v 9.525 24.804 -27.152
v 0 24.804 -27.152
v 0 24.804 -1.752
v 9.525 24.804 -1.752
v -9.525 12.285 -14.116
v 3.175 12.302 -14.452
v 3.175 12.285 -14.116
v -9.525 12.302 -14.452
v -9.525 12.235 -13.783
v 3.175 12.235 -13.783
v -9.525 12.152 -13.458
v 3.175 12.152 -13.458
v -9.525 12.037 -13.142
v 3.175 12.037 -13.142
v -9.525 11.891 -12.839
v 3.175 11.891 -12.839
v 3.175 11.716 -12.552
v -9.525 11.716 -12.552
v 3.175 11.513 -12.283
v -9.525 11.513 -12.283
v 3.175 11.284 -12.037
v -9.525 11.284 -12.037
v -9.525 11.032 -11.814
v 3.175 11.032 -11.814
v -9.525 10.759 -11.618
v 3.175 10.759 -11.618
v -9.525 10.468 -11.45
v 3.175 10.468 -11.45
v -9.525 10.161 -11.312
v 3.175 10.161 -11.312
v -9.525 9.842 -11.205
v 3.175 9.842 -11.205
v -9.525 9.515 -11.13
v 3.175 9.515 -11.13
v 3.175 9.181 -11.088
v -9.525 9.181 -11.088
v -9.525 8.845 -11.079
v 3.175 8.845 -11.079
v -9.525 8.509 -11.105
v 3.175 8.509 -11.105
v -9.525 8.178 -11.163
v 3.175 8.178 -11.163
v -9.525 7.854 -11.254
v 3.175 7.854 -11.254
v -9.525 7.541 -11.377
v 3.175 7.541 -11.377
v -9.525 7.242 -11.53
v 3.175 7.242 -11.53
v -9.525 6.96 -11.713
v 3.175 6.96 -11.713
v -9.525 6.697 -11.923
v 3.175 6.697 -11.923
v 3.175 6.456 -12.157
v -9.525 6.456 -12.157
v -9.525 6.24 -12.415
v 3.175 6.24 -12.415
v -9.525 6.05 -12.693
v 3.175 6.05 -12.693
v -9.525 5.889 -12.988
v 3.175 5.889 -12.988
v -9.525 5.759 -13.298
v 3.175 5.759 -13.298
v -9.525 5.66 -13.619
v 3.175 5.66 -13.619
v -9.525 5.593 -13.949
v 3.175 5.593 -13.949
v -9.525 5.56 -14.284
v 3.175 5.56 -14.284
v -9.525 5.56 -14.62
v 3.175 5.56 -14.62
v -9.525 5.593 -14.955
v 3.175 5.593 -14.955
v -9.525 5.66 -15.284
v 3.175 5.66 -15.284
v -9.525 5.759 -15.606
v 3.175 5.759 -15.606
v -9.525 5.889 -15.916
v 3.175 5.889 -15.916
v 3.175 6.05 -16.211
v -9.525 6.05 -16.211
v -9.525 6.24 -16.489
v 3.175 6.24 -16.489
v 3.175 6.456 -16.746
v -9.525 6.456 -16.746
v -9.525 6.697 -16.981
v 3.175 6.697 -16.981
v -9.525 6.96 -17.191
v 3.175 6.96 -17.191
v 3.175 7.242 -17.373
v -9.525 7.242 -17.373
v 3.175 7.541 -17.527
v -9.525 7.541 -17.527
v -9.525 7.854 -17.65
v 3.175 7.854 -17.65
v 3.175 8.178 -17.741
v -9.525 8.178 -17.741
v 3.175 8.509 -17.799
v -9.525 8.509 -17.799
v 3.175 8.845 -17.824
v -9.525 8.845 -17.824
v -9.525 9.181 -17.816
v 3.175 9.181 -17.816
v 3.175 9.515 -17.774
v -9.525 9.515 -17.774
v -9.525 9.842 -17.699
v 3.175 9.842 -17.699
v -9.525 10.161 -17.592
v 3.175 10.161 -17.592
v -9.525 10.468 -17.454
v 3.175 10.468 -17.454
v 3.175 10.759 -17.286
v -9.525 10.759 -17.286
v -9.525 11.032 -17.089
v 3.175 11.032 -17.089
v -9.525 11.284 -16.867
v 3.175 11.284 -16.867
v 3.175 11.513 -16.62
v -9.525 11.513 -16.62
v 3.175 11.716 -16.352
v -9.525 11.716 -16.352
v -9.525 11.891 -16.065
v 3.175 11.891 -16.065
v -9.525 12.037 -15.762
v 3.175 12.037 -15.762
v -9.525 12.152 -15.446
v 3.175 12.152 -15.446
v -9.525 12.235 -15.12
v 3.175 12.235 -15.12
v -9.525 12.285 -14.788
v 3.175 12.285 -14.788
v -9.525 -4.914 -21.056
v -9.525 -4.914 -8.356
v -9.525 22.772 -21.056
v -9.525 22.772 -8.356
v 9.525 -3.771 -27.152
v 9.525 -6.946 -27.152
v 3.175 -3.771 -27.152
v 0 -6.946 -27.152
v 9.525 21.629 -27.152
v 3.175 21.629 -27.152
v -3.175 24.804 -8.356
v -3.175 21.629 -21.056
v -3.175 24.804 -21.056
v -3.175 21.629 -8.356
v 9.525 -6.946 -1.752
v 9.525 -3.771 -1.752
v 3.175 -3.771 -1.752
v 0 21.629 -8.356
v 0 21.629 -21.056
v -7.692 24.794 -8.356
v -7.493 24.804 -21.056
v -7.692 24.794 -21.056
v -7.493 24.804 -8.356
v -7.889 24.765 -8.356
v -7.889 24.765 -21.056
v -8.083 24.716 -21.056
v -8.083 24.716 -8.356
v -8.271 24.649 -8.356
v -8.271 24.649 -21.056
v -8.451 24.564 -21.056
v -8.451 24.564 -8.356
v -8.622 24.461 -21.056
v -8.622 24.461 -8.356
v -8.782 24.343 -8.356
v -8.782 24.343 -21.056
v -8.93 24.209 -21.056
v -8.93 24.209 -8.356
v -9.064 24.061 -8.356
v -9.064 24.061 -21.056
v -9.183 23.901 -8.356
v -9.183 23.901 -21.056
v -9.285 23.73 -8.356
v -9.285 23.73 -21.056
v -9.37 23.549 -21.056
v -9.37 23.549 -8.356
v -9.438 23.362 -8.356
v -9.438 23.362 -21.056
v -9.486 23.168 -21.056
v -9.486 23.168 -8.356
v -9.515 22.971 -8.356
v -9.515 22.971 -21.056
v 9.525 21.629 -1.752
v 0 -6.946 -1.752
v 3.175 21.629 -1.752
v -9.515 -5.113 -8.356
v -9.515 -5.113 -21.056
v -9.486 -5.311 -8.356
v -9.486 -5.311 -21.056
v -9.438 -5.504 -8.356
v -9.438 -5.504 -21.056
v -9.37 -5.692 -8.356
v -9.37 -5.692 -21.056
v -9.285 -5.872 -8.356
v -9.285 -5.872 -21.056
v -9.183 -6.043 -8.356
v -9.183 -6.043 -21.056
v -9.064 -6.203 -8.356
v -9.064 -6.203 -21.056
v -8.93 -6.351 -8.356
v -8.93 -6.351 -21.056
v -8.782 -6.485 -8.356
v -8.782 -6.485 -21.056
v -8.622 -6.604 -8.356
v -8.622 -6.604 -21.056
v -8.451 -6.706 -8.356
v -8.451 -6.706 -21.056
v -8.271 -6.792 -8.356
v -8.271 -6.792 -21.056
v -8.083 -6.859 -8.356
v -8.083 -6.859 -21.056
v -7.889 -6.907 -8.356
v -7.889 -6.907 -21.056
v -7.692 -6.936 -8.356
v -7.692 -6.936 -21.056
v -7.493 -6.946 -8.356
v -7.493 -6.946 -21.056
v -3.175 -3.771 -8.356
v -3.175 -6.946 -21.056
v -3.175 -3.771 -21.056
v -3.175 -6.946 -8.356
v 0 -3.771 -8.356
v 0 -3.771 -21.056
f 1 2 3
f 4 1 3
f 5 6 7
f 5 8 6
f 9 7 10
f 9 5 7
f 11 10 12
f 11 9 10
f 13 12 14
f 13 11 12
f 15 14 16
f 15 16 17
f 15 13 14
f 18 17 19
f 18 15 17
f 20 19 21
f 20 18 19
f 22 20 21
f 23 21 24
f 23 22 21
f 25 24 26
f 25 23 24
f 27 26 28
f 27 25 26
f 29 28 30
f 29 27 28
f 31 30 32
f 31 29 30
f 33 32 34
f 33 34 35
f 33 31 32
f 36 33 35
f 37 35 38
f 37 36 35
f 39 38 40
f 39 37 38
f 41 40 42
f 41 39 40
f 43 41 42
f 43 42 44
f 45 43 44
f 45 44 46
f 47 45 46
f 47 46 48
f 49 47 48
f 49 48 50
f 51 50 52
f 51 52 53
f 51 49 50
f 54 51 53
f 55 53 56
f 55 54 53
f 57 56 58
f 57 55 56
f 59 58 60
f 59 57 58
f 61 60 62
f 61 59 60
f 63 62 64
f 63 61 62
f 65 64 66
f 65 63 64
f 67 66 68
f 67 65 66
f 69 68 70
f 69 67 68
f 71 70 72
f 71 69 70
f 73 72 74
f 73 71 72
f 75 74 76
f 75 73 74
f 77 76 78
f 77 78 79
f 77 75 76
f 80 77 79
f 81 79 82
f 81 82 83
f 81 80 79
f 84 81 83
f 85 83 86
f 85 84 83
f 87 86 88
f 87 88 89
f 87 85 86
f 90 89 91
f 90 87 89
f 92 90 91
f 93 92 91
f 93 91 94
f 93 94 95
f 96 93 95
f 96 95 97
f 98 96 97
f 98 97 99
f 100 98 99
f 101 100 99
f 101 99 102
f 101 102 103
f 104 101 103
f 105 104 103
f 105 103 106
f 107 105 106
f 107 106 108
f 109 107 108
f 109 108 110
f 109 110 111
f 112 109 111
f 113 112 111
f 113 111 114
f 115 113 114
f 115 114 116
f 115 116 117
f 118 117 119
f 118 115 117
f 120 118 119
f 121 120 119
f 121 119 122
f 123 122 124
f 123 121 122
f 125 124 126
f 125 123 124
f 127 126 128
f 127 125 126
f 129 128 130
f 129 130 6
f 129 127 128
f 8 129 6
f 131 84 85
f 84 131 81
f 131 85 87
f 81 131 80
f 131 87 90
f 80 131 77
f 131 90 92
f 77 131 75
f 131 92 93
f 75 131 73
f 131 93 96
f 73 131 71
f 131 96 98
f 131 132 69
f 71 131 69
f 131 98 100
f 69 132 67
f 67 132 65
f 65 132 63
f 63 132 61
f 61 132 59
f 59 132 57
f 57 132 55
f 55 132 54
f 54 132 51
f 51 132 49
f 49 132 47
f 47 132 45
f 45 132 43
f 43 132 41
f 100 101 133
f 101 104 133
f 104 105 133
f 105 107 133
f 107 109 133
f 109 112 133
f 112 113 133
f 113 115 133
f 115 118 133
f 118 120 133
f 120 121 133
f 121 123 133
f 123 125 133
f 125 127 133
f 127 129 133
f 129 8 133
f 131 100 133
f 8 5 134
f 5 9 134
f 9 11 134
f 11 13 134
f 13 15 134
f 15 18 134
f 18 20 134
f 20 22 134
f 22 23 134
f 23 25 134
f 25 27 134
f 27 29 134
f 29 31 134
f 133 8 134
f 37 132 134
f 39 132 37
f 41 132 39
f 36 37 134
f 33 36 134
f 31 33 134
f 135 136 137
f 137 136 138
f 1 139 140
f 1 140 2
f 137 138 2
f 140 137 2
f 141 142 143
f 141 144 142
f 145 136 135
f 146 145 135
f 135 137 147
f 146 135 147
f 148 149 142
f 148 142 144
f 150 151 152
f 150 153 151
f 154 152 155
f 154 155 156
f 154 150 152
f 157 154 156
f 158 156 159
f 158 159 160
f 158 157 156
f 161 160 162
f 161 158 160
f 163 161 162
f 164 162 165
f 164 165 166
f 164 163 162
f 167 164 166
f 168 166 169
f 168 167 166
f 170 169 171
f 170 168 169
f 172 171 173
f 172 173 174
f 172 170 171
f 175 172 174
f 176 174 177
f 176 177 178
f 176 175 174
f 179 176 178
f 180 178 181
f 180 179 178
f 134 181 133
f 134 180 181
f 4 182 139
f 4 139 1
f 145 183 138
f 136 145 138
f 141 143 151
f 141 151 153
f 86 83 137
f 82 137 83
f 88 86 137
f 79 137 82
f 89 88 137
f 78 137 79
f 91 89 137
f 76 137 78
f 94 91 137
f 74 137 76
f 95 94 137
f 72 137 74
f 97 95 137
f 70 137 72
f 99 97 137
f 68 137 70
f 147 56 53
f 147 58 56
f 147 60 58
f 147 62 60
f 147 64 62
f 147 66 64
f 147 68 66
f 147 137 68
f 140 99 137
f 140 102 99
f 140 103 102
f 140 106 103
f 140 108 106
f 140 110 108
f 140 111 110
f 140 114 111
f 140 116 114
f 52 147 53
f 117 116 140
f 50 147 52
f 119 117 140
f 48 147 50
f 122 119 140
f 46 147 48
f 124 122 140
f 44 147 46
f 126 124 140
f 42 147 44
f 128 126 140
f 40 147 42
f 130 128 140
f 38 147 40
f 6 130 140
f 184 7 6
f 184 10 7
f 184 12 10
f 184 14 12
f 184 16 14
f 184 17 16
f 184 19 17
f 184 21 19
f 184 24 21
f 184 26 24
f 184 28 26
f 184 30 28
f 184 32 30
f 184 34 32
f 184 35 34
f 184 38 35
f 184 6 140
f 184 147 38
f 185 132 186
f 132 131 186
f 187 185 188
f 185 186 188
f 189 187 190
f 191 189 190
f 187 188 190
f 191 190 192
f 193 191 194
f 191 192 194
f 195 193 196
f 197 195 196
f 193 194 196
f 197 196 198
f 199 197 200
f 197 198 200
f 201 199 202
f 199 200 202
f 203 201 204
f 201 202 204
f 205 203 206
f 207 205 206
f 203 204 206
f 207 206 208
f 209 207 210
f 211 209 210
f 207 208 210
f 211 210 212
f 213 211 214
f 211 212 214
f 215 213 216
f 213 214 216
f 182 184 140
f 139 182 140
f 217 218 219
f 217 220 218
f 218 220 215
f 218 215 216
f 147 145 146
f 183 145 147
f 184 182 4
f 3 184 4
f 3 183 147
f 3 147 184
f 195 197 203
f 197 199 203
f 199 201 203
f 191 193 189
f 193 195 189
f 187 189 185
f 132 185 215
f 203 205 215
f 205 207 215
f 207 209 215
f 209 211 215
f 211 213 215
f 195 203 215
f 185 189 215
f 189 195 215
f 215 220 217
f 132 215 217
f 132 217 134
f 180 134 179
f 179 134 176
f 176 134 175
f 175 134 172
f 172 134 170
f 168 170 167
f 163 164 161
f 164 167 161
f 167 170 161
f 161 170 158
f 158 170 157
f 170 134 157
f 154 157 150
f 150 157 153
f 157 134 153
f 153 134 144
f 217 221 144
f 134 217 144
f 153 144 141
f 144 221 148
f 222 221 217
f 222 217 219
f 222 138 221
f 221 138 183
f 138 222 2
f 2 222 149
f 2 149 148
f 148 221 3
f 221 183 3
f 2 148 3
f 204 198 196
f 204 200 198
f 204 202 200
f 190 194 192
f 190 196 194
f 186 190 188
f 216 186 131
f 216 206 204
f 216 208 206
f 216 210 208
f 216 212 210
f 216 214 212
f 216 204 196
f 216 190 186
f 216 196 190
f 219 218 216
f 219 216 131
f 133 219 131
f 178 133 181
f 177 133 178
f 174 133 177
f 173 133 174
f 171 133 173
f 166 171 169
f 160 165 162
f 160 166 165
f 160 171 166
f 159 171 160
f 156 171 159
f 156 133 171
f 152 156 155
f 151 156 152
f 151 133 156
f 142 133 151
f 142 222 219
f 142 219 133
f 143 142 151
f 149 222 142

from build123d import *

# Parameters (mm, degrees)
F0_W     = 3.175
F0_H     = 6.6040001805
F0_H_2   = 3.81
F0_H_3   = 6.0959998195
F0_H_4   = 5.08
F1_DEPTH = 9.525
F0_R     = 3.3734375
F2_DEPTH = 9.525
F0_W_2   = 25.4
F3_DEPTH = 3.175
F4_START = -3.175
F4_DEPTH = 6.35
F5_R     = 2.032


# Not quite as in the source:
# - a feature names something its author has since deleted; it is built from what else it names


with BuildPart() as f1:
    # F0 (on Right) → F1 (new body)
    with BuildSketch(Plane.YZ):
        with Locations((23.2162721504, -5.0538677492)):
            Rectangle(F0_W, F0_H)
        with Locations((23.2162721504, -10.2608678395)):
            Rectangle(F0_W, F0_H_2)
        with Locations((23.2162721504, -19.1508678395)):
            Rectangle(F0_W, F0_H_2)
        with Locations((23.2162721504, -24.1038677492)):
            Rectangle(F0_W, F0_H_3)
        with Locations((23.2162721504, -14.7058678395)):
            Rectangle(F0_W, F0_H_4)
    extrude(amount=F1_DEPTH)



with BuildPart() as f1b:
    # F0 (on Right) → F1, piece 2 (new body)
    with BuildSketch(Plane.YZ):
        with Locations((-5.3587278496, -24.1038677492)):
            Rectangle(F0_W, F0_H_3)
        with Locations((-5.3587278496, -14.7058678395)):
            Rectangle(F0_W, F0_H_4)
        with Locations((-5.3587278496, -10.2608678395)):
            Rectangle(F0_W, F0_H_2)
        with Locations((-5.3587278496, -5.0538677492)):
            Rectangle(F0_W, F0_H)
        with Locations((-5.3587278496, -19.1508678395)):
            Rectangle(F0_W, F0_H_2)
    extrude(amount=F1_DEPTH)


with BuildPart() as f1_1:
    add(f1.part)

    add(f1b.part)  # F2 merges F1b
    # F0 (on Right) → F2 (join)
    with BuildSketch(Plane.YZ):
        Polygon((21.6287721504, -8.3558678395), (-3.7712278496, -8.3558678395), (-3.7712278496, -12.1658678395), (-3.7712278496, -17.2458678395), (-3.7712278496, -21.0558678395), (21.6287721504, -21.0558678395), (21.6287721504, -17.2458678395), (21.6287721504, -12.1658678395), align=None)
        with Locations((8.9287721504, -14.451867659)):
            Circle(F0_R, mode=Mode.SUBTRACT)
    extrude(amount=-F2_DEPTH)

    # F0 (on Right) → F3 (join)
    with BuildSketch(Plane.YZ):
        with Locations((8.9287721504, -5.0538677492)):
            Rectangle(F0_W_2, F0_H)
        Polygon((21.6287721504, -8.3558678395), (-3.7712278496, -8.3558678395), (-3.7712278496, -12.1658678395), (-3.7712278496, -17.2458678395), (-3.7712278496, -21.0558678395), (21.6287721504, -21.0558678395), (21.6287721504, -17.2458678395), (21.6287721504, -12.1658678395), align=None)
        with Locations((8.9287721504, -14.451867659)):
            Circle(F0_R, mode=Mode.SUBTRACT)
        with Locations((8.9287721504, -24.1038677492)):
            Rectangle(F0_W_2, F0_H_3)
    extrude(amount=F3_DEPTH)

    # F0 (on Right) → F4 (join)
    with BuildSketch(Plane.YZ.offset(F4_START)):
        with Locations((-5.3587278496, -14.7058678395)):
            Rectangle(F0_W, F0_H_4)
        with Locations((23.2162721504, -14.7058678395)):
            Rectangle(F0_W, F0_H_4)
        with Locations((23.2162721504, -19.1508678395)):
            Rectangle(F0_W, F0_H_2)
        with Locations((23.2162721504, -10.2608678395)):
            Rectangle(F0_W, F0_H_2)
        with Locations((-5.3587278496, -19.1508678395)):
            Rectangle(F0_W, F0_H_2)
        with Locations((-5.3587278496, -10.2608678395)):
            Rectangle(F0_W, F0_H_2)
    extrude(amount=-F4_DEPTH)

    # F5
    f5_edges = [f1_1.edges().sort_by_distance(p)[0] for p in [
        (-9.525, -6.946228, -14.705868),
        (-9.525, 24.803772, -14.705868),
    ]]
    fillet(f5_edges, radius=F5_R)


solid = f1_1.part
